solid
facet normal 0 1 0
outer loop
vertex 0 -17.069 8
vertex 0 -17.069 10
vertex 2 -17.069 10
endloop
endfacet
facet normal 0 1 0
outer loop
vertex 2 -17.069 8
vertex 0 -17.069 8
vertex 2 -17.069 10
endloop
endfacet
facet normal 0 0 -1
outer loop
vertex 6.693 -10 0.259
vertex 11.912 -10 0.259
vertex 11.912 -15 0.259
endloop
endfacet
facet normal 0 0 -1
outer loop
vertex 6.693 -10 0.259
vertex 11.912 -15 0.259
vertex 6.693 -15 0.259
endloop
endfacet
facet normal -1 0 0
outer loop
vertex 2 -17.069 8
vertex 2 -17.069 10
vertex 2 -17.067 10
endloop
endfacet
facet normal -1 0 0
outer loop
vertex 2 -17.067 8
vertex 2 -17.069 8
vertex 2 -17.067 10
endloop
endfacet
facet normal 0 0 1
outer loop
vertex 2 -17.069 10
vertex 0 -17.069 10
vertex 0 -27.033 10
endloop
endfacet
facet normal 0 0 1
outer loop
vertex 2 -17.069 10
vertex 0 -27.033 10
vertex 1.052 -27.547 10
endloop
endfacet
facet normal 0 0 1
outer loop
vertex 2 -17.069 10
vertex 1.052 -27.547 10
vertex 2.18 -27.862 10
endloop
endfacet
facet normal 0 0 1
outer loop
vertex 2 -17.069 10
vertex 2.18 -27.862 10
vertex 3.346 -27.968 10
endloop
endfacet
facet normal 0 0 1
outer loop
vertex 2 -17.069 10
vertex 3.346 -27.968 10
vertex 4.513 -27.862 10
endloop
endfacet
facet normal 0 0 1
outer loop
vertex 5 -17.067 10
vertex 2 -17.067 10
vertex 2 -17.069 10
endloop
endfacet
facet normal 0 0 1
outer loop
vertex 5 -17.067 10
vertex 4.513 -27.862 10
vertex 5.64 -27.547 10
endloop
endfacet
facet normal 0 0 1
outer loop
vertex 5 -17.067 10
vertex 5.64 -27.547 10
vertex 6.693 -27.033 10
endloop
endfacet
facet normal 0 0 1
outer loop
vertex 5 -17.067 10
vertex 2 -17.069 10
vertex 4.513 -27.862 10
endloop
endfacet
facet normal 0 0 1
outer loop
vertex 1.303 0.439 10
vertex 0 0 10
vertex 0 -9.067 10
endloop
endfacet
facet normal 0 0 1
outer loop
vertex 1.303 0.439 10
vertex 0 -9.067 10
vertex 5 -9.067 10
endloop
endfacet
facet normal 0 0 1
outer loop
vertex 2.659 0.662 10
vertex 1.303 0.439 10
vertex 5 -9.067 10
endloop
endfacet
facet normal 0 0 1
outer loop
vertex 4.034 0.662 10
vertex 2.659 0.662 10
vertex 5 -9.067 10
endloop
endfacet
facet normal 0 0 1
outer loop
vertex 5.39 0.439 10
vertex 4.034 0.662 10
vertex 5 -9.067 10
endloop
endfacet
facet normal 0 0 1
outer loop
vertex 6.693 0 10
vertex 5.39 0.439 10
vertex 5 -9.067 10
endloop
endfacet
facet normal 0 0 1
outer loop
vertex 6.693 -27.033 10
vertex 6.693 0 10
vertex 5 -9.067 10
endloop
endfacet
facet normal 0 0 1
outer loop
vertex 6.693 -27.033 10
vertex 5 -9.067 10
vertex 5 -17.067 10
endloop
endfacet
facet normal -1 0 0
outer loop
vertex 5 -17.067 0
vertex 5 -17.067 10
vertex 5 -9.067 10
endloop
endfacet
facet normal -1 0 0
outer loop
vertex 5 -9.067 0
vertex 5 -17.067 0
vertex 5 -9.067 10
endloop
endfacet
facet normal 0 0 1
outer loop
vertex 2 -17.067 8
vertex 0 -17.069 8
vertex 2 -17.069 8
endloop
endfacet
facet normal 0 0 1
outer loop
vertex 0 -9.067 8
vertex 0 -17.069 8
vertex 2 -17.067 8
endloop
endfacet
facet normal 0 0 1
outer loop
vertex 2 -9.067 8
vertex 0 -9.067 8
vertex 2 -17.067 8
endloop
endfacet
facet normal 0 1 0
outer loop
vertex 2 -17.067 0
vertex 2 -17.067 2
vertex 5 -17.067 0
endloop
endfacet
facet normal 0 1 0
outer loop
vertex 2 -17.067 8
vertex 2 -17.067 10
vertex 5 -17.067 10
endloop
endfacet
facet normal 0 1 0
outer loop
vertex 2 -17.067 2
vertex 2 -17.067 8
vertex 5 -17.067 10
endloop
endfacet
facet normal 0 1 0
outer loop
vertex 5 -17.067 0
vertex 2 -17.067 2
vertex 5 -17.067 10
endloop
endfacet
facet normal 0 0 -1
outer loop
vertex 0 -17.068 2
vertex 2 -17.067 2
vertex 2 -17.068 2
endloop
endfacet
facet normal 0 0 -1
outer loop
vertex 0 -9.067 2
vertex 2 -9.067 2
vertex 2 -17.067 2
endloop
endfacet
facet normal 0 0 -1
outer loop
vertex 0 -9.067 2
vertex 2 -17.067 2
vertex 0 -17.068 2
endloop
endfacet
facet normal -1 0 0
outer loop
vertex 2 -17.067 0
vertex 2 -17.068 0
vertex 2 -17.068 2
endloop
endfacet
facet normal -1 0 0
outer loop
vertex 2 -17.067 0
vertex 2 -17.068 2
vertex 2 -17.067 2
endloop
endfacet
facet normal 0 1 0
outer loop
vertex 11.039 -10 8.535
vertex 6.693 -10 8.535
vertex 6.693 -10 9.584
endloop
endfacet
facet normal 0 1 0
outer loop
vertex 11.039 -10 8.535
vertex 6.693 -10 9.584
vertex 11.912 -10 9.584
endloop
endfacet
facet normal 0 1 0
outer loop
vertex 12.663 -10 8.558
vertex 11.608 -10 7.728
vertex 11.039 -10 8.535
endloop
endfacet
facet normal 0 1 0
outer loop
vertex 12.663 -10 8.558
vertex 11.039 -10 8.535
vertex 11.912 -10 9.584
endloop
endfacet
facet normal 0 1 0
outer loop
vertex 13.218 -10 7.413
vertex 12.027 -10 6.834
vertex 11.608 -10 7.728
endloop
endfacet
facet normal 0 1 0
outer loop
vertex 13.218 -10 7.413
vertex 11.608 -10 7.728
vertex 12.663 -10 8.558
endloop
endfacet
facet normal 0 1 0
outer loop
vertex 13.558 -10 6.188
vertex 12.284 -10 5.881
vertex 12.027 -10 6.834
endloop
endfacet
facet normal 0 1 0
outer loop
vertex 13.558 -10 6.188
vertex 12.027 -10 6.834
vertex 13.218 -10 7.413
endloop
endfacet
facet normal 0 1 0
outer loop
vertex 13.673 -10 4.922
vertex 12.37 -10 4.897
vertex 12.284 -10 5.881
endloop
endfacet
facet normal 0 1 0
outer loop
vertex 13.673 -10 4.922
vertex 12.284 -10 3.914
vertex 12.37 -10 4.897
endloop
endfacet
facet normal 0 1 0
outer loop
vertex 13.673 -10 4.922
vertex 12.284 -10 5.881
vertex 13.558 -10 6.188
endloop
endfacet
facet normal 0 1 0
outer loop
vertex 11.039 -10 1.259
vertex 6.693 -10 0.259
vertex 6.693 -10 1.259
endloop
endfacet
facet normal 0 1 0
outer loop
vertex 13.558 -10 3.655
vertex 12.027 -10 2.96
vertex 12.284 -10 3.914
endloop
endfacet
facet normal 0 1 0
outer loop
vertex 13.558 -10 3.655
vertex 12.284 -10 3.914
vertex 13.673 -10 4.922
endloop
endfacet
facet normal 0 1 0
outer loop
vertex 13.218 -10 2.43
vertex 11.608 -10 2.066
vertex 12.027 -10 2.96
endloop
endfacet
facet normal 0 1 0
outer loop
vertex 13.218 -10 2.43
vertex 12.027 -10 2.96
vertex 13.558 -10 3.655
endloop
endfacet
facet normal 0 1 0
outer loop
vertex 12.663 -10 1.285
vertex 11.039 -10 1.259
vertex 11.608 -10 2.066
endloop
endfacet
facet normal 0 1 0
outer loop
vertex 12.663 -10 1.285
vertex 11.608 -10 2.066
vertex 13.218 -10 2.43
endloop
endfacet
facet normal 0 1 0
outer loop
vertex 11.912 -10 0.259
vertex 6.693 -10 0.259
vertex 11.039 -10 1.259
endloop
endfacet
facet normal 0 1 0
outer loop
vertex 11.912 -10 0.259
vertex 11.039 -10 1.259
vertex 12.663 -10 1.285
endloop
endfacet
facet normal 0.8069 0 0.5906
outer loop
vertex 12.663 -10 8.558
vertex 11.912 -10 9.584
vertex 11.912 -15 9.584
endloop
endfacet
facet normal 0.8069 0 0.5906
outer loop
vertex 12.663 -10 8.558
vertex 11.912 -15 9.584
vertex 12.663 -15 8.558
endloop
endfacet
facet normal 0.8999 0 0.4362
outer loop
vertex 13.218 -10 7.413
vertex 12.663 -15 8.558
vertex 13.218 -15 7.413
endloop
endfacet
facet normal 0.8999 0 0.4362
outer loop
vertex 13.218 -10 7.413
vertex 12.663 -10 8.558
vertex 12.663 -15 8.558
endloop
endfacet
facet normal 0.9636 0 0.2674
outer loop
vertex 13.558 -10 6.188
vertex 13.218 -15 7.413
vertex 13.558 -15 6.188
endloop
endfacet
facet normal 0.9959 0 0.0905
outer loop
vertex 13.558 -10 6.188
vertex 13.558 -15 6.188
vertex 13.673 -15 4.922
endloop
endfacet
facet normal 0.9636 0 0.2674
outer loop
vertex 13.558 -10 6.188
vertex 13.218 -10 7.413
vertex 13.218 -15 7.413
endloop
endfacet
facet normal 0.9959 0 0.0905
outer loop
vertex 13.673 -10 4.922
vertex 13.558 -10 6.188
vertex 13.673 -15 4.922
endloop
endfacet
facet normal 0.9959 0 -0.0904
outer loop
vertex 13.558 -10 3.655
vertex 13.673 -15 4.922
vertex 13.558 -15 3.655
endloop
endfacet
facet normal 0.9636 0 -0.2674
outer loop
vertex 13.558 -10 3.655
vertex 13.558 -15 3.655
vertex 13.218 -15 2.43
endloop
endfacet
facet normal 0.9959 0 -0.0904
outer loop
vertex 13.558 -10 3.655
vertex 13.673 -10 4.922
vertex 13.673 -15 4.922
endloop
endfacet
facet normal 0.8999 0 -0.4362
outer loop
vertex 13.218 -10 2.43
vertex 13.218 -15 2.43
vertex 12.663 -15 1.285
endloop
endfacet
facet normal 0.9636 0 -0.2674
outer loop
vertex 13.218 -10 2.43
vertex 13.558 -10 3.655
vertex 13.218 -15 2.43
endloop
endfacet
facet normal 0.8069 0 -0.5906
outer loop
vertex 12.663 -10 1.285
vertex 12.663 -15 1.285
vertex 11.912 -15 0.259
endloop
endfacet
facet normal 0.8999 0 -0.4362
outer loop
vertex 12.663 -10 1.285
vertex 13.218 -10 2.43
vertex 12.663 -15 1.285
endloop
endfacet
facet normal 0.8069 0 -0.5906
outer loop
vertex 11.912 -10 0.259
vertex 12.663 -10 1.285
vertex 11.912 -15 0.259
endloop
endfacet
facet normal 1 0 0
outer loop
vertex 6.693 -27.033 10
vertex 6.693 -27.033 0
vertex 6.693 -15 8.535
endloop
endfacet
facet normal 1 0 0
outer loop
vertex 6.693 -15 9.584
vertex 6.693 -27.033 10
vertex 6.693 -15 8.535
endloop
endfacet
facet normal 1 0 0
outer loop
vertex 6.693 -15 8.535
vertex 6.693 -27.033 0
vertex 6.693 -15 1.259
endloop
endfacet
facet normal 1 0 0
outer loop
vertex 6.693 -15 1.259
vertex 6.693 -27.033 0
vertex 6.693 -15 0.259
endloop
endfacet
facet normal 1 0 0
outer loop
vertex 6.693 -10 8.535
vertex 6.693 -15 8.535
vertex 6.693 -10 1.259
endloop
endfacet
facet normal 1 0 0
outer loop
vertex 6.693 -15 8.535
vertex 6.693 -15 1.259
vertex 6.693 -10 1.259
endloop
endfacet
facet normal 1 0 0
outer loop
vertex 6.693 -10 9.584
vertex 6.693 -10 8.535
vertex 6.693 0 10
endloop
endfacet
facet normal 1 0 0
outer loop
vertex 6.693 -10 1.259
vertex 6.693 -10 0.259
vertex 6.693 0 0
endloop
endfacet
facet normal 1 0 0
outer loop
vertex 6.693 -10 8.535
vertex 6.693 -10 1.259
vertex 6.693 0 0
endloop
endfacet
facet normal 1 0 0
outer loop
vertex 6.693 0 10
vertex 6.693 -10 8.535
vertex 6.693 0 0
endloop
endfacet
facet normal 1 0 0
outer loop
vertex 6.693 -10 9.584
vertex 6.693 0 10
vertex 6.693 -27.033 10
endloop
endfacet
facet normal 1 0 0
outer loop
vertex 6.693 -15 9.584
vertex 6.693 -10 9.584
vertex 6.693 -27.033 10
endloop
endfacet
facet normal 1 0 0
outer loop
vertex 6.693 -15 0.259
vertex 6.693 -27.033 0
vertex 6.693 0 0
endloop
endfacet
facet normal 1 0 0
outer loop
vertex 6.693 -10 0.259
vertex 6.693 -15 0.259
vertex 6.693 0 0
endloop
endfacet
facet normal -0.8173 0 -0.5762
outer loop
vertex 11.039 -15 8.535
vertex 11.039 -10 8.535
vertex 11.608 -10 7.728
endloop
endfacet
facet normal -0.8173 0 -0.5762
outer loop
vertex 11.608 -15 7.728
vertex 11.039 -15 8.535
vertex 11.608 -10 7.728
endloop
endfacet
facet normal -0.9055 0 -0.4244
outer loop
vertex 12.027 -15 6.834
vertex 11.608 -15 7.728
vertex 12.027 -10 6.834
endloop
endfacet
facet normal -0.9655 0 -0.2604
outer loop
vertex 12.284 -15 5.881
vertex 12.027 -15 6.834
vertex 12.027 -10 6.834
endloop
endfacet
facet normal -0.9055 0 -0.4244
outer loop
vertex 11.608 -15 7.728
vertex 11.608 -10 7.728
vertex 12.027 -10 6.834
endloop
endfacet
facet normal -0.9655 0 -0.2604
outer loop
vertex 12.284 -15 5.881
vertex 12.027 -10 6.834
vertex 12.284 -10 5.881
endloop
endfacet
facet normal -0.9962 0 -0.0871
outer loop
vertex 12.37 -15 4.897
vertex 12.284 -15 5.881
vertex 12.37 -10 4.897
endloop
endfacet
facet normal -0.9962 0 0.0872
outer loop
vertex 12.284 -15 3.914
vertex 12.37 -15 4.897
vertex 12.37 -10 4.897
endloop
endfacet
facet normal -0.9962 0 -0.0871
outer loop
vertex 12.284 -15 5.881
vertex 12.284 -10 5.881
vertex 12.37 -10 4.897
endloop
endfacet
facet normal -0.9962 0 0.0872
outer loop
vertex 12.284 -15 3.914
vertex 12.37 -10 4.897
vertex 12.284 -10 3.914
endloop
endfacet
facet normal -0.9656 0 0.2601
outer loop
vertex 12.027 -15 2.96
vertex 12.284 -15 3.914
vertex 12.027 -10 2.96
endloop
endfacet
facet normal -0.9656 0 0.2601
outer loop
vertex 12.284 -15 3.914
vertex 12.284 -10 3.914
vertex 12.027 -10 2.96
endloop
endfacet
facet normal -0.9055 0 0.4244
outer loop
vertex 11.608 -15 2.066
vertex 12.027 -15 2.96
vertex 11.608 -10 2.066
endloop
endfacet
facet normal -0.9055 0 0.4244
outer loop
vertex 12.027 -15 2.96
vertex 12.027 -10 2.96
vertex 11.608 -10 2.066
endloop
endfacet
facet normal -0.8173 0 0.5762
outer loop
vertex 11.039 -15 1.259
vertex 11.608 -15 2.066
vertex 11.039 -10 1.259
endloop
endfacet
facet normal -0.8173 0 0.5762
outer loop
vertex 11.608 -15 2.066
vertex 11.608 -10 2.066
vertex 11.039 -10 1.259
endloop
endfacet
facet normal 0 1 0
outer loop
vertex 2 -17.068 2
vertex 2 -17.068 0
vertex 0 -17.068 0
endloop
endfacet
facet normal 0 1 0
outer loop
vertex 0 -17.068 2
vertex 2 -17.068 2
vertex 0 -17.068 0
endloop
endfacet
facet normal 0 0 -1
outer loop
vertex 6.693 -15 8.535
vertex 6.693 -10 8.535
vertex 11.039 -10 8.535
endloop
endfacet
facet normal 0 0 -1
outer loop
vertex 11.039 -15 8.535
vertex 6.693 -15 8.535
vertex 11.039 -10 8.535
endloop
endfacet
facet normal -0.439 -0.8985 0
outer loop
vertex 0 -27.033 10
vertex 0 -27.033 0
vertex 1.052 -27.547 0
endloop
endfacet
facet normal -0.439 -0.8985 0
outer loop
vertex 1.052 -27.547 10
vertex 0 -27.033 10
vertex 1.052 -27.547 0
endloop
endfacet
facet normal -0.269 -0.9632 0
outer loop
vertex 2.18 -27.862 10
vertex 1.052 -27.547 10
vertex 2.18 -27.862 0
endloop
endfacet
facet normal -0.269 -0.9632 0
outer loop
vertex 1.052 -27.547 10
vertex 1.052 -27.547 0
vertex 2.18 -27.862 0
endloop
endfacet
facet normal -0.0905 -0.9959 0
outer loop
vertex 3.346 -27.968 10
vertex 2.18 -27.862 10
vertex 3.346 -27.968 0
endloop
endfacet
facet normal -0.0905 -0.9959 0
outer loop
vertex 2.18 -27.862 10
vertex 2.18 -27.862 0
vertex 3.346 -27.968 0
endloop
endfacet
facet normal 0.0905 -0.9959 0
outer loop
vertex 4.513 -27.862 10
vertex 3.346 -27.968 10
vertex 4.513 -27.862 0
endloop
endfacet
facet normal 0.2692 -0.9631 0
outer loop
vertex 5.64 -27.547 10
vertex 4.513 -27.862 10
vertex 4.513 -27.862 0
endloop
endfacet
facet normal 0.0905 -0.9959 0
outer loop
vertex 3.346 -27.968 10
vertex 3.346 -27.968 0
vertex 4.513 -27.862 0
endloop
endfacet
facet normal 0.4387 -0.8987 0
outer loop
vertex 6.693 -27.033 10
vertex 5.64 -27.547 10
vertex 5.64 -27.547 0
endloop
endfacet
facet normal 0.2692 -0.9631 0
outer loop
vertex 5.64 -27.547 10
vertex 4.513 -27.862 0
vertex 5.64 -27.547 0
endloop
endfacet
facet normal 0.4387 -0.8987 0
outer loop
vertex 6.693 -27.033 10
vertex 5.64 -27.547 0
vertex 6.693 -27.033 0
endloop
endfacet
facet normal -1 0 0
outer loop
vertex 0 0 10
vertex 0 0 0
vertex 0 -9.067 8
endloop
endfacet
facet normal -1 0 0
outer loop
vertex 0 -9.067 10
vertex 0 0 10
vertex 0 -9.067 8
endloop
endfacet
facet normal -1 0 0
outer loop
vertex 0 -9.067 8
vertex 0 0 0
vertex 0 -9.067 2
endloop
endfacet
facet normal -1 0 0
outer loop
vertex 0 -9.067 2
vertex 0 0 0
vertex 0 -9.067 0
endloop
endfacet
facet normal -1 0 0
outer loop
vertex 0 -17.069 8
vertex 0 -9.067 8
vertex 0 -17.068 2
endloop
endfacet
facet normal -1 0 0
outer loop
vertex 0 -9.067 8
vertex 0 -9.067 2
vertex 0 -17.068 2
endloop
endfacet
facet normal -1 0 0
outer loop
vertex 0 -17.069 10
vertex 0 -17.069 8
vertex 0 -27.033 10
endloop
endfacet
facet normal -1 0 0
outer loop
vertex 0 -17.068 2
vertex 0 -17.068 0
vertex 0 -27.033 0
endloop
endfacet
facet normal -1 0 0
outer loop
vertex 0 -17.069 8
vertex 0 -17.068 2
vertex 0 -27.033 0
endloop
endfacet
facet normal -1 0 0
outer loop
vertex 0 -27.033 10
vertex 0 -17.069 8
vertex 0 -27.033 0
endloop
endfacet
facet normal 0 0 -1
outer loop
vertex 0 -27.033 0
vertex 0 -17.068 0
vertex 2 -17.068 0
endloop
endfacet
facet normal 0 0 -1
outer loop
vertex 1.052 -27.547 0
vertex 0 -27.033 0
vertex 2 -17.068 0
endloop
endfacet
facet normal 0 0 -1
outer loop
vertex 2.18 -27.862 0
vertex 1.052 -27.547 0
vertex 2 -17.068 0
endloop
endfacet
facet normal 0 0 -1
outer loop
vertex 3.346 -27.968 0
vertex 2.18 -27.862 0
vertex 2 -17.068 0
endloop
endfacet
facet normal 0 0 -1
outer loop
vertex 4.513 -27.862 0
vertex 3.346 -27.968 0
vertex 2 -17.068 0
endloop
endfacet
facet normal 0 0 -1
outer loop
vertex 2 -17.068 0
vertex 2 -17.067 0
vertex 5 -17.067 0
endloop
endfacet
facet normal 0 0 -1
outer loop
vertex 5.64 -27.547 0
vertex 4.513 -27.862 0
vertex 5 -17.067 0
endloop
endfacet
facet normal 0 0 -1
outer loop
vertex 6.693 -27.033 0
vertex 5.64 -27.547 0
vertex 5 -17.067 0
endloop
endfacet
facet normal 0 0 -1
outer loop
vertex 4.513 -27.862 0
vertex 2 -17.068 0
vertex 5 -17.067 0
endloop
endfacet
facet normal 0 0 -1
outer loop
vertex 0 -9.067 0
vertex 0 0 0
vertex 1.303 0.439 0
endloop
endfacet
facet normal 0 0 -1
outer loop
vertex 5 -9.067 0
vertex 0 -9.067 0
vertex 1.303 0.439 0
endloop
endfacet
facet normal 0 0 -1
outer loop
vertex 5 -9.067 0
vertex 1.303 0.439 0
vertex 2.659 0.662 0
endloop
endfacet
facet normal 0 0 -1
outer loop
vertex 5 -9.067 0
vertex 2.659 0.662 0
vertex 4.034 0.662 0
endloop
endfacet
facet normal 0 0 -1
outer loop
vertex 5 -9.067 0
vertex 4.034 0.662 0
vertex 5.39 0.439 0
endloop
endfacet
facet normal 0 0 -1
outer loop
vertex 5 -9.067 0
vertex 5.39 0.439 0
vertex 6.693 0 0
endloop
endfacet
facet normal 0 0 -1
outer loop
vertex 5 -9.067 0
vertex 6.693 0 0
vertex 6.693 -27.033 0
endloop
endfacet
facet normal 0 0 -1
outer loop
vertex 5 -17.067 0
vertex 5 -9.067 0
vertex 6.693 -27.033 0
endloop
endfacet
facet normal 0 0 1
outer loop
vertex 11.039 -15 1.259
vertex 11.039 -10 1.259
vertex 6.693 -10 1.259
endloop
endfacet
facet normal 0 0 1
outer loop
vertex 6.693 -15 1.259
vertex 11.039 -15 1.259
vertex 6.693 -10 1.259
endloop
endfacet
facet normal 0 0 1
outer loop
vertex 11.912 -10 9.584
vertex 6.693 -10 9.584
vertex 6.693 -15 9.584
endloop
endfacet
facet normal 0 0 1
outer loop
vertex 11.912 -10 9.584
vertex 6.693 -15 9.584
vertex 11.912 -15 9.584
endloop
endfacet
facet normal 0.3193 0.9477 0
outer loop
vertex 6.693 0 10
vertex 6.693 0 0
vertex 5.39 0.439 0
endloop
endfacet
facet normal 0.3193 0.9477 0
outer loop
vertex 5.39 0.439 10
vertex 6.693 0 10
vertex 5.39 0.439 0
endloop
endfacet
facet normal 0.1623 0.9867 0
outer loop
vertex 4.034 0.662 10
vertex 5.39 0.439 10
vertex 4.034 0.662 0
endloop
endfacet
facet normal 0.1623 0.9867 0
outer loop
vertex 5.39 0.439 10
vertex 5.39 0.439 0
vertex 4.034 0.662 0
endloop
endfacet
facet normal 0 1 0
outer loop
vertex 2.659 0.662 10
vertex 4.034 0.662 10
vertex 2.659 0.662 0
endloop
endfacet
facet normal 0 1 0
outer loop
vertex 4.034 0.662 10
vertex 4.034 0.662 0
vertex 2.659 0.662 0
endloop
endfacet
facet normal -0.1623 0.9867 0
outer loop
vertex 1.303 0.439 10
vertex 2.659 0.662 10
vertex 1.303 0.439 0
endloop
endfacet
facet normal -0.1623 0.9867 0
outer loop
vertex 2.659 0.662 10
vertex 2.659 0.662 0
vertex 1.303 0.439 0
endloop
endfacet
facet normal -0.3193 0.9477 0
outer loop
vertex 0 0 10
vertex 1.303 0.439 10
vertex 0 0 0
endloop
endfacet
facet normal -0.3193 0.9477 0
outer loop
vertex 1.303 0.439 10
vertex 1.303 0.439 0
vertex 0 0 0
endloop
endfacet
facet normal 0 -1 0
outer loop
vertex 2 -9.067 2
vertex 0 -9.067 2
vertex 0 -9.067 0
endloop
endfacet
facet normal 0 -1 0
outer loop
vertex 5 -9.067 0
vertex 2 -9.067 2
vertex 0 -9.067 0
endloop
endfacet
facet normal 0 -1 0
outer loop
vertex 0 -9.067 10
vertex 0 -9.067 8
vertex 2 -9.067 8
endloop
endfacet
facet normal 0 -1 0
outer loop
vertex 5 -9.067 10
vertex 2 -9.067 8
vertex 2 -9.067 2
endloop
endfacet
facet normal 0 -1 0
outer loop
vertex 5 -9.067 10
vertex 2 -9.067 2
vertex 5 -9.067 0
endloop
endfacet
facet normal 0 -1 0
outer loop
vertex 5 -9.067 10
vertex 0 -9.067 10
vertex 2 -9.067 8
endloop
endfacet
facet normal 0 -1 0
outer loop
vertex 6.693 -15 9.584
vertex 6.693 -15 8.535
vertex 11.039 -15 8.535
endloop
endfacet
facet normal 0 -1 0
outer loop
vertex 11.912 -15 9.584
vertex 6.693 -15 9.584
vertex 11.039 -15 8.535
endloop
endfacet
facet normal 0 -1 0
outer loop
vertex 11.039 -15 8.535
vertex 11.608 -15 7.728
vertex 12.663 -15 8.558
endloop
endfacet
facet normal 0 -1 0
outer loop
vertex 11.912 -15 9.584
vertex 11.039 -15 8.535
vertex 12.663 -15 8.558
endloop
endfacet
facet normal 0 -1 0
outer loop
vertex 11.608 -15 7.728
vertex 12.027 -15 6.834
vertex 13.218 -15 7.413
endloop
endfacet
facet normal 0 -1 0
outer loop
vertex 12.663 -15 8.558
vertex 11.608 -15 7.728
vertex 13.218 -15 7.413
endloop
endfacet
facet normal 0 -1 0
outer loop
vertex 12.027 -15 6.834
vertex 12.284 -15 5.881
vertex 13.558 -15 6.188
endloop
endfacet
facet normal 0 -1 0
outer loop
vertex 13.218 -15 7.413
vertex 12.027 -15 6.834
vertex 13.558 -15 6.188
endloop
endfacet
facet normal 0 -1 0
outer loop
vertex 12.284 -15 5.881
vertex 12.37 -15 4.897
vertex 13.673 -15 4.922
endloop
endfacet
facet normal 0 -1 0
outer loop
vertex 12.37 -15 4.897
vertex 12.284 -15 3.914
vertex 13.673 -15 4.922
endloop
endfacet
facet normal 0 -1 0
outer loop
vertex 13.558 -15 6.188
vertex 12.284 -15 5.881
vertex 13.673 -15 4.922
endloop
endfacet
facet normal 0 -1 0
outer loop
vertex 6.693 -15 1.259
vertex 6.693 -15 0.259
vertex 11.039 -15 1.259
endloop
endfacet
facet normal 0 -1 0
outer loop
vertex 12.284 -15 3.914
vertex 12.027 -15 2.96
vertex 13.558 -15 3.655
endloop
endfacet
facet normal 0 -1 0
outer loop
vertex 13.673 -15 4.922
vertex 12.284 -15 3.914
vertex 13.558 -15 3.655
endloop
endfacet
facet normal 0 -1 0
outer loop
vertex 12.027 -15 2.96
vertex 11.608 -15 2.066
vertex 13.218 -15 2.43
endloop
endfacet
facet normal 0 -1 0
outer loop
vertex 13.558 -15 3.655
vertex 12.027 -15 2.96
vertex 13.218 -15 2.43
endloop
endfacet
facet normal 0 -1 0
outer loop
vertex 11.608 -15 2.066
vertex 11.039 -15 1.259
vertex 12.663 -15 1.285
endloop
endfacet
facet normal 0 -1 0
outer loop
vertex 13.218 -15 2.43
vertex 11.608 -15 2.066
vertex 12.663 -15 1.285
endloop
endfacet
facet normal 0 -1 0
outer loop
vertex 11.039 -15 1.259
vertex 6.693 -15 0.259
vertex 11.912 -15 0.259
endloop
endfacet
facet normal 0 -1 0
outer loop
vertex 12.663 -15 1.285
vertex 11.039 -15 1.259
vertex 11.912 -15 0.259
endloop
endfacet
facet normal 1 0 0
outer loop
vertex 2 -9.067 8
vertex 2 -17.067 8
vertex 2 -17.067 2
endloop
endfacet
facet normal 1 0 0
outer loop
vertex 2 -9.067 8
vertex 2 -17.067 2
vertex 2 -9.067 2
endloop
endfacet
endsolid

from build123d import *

# Parameters (mm, degrees)
EXTRUDE_1_DEPTH     = 10
SKETCH_3_W          = 3
SKETCH_3_H          = 8
CUT_EXTRUDE_2_DEPTH = 10
EXTRUDE_2_DEPTH     = 2.5
CUT_EXTRUDE_3_DEPTH = 5
SKETCH_7_W          = 2
SKETCH_7_H          = 8.000466976
CUT_EXTRUDE_4_DEPTH = 2
SKETCH_8_W          = 2
SKETCH_8_H          = 8.002206322
CUT_EXTRUDE_5_DEPTH = 2


with BuildPart() as part:
    # 草圖1 → 填料-伸長1 (new body)
    with BuildSketch(Plane.XY):
        with BuildLine():
            Line((0, 0), (0, -27.033455112))
            ThreePointArc((0, -27.033455112), (3.346359716, -27.968396912), (6.692719433, -27.033455112))
            Line((6.692719433, -27.033455112), (6.692719433, 0))
            ThreePointArc((6.692719433, 0), (3.346359716, 0.689675236), (0, 0))
        make_face()
    extrude(amount=EXTRUDE_1_DEPTH)

    # 草圖3 → 除料-伸長2 (cut)
    with BuildSketch(Plane.XY.offset(10)):
        with Locations((3.5, -13.067229779)):
            Rectangle(SKETCH_3_W, SKETCH_3_H)
    extrude(amount=-CUT_EXTRUDE_2_DEPTH, mode=Mode.SUBTRACT)

    # 草圖4 → 填料-伸長2 (add, symmetric)
    with BuildSketch(Plane(origin=(0, -12.5, -0.092640319), x_dir=(1, 0, 0), z_dir=(0, 1, 0))):
        with BuildLine():
            Line((6.308695553, -9.676441633), (11.912423264, -9.676441633))
            ThreePointArc((11.912423264, -9.676441633), (13.672894686, -5.014177318), (11.912423264, -0.351913003))
            Line((11.912423264, -0.351913003), (6.308695553, -0.351913003))
            Line((6.308695553, -0.351913003), (6.308695553, -9.676441633))
        make_face()
    extrude(amount=EXTRUDE_2_DEPTH, both=True)

    # 草圖6 → 除料-伸長3 (cut)
    with BuildSketch(Plane(origin=(0, -10, 0), x_dir=(1, 0, 0), z_dir=(0, 1, 0))):
        with BuildLine():
            Line((6.692719433, -8.535251287), (11.039203193, -8.535251287))
            ThreePointArc((11.039203193, -8.535251287), (12.370150215, -4.897261986), (11.039203193, -1.259272684))
            Line((11.039203193, -1.259272684), (6.692719433, -1.259272684))
            Line((6.692719433, -1.259272684), (6.692719433, -8.535251287))
        make_face()
    extrude(amount=-CUT_EXTRUDE_3_DEPTH, mode=Mode.SUBTRACT)

    # 草圖7 → 除料-伸長4 (cut)
    with BuildSketch(Plane(origin=(0, 0, 0), x_dir=(-1, 0, 0), z_dir=(0, 0, -1))):
        with Locations((-1, -13.067463267)):
            Rectangle(SKETCH_7_W, SKETCH_7_H)
    extrude(amount=-CUT_EXTRUDE_4_DEPTH, mode=Mode.SUBTRACT)

    # 草圖8 → 除料-伸長5 (cut)
    with BuildSketch(Plane.XY.offset(10)):
        with Locations((1, -13.06833294)):
            Rectangle(SKETCH_8_W, SKETCH_8_H)
    extrude(amount=-CUT_EXTRUDE_5_DEPTH, mode=Mode.SUBTRACT)


solid = part.part
